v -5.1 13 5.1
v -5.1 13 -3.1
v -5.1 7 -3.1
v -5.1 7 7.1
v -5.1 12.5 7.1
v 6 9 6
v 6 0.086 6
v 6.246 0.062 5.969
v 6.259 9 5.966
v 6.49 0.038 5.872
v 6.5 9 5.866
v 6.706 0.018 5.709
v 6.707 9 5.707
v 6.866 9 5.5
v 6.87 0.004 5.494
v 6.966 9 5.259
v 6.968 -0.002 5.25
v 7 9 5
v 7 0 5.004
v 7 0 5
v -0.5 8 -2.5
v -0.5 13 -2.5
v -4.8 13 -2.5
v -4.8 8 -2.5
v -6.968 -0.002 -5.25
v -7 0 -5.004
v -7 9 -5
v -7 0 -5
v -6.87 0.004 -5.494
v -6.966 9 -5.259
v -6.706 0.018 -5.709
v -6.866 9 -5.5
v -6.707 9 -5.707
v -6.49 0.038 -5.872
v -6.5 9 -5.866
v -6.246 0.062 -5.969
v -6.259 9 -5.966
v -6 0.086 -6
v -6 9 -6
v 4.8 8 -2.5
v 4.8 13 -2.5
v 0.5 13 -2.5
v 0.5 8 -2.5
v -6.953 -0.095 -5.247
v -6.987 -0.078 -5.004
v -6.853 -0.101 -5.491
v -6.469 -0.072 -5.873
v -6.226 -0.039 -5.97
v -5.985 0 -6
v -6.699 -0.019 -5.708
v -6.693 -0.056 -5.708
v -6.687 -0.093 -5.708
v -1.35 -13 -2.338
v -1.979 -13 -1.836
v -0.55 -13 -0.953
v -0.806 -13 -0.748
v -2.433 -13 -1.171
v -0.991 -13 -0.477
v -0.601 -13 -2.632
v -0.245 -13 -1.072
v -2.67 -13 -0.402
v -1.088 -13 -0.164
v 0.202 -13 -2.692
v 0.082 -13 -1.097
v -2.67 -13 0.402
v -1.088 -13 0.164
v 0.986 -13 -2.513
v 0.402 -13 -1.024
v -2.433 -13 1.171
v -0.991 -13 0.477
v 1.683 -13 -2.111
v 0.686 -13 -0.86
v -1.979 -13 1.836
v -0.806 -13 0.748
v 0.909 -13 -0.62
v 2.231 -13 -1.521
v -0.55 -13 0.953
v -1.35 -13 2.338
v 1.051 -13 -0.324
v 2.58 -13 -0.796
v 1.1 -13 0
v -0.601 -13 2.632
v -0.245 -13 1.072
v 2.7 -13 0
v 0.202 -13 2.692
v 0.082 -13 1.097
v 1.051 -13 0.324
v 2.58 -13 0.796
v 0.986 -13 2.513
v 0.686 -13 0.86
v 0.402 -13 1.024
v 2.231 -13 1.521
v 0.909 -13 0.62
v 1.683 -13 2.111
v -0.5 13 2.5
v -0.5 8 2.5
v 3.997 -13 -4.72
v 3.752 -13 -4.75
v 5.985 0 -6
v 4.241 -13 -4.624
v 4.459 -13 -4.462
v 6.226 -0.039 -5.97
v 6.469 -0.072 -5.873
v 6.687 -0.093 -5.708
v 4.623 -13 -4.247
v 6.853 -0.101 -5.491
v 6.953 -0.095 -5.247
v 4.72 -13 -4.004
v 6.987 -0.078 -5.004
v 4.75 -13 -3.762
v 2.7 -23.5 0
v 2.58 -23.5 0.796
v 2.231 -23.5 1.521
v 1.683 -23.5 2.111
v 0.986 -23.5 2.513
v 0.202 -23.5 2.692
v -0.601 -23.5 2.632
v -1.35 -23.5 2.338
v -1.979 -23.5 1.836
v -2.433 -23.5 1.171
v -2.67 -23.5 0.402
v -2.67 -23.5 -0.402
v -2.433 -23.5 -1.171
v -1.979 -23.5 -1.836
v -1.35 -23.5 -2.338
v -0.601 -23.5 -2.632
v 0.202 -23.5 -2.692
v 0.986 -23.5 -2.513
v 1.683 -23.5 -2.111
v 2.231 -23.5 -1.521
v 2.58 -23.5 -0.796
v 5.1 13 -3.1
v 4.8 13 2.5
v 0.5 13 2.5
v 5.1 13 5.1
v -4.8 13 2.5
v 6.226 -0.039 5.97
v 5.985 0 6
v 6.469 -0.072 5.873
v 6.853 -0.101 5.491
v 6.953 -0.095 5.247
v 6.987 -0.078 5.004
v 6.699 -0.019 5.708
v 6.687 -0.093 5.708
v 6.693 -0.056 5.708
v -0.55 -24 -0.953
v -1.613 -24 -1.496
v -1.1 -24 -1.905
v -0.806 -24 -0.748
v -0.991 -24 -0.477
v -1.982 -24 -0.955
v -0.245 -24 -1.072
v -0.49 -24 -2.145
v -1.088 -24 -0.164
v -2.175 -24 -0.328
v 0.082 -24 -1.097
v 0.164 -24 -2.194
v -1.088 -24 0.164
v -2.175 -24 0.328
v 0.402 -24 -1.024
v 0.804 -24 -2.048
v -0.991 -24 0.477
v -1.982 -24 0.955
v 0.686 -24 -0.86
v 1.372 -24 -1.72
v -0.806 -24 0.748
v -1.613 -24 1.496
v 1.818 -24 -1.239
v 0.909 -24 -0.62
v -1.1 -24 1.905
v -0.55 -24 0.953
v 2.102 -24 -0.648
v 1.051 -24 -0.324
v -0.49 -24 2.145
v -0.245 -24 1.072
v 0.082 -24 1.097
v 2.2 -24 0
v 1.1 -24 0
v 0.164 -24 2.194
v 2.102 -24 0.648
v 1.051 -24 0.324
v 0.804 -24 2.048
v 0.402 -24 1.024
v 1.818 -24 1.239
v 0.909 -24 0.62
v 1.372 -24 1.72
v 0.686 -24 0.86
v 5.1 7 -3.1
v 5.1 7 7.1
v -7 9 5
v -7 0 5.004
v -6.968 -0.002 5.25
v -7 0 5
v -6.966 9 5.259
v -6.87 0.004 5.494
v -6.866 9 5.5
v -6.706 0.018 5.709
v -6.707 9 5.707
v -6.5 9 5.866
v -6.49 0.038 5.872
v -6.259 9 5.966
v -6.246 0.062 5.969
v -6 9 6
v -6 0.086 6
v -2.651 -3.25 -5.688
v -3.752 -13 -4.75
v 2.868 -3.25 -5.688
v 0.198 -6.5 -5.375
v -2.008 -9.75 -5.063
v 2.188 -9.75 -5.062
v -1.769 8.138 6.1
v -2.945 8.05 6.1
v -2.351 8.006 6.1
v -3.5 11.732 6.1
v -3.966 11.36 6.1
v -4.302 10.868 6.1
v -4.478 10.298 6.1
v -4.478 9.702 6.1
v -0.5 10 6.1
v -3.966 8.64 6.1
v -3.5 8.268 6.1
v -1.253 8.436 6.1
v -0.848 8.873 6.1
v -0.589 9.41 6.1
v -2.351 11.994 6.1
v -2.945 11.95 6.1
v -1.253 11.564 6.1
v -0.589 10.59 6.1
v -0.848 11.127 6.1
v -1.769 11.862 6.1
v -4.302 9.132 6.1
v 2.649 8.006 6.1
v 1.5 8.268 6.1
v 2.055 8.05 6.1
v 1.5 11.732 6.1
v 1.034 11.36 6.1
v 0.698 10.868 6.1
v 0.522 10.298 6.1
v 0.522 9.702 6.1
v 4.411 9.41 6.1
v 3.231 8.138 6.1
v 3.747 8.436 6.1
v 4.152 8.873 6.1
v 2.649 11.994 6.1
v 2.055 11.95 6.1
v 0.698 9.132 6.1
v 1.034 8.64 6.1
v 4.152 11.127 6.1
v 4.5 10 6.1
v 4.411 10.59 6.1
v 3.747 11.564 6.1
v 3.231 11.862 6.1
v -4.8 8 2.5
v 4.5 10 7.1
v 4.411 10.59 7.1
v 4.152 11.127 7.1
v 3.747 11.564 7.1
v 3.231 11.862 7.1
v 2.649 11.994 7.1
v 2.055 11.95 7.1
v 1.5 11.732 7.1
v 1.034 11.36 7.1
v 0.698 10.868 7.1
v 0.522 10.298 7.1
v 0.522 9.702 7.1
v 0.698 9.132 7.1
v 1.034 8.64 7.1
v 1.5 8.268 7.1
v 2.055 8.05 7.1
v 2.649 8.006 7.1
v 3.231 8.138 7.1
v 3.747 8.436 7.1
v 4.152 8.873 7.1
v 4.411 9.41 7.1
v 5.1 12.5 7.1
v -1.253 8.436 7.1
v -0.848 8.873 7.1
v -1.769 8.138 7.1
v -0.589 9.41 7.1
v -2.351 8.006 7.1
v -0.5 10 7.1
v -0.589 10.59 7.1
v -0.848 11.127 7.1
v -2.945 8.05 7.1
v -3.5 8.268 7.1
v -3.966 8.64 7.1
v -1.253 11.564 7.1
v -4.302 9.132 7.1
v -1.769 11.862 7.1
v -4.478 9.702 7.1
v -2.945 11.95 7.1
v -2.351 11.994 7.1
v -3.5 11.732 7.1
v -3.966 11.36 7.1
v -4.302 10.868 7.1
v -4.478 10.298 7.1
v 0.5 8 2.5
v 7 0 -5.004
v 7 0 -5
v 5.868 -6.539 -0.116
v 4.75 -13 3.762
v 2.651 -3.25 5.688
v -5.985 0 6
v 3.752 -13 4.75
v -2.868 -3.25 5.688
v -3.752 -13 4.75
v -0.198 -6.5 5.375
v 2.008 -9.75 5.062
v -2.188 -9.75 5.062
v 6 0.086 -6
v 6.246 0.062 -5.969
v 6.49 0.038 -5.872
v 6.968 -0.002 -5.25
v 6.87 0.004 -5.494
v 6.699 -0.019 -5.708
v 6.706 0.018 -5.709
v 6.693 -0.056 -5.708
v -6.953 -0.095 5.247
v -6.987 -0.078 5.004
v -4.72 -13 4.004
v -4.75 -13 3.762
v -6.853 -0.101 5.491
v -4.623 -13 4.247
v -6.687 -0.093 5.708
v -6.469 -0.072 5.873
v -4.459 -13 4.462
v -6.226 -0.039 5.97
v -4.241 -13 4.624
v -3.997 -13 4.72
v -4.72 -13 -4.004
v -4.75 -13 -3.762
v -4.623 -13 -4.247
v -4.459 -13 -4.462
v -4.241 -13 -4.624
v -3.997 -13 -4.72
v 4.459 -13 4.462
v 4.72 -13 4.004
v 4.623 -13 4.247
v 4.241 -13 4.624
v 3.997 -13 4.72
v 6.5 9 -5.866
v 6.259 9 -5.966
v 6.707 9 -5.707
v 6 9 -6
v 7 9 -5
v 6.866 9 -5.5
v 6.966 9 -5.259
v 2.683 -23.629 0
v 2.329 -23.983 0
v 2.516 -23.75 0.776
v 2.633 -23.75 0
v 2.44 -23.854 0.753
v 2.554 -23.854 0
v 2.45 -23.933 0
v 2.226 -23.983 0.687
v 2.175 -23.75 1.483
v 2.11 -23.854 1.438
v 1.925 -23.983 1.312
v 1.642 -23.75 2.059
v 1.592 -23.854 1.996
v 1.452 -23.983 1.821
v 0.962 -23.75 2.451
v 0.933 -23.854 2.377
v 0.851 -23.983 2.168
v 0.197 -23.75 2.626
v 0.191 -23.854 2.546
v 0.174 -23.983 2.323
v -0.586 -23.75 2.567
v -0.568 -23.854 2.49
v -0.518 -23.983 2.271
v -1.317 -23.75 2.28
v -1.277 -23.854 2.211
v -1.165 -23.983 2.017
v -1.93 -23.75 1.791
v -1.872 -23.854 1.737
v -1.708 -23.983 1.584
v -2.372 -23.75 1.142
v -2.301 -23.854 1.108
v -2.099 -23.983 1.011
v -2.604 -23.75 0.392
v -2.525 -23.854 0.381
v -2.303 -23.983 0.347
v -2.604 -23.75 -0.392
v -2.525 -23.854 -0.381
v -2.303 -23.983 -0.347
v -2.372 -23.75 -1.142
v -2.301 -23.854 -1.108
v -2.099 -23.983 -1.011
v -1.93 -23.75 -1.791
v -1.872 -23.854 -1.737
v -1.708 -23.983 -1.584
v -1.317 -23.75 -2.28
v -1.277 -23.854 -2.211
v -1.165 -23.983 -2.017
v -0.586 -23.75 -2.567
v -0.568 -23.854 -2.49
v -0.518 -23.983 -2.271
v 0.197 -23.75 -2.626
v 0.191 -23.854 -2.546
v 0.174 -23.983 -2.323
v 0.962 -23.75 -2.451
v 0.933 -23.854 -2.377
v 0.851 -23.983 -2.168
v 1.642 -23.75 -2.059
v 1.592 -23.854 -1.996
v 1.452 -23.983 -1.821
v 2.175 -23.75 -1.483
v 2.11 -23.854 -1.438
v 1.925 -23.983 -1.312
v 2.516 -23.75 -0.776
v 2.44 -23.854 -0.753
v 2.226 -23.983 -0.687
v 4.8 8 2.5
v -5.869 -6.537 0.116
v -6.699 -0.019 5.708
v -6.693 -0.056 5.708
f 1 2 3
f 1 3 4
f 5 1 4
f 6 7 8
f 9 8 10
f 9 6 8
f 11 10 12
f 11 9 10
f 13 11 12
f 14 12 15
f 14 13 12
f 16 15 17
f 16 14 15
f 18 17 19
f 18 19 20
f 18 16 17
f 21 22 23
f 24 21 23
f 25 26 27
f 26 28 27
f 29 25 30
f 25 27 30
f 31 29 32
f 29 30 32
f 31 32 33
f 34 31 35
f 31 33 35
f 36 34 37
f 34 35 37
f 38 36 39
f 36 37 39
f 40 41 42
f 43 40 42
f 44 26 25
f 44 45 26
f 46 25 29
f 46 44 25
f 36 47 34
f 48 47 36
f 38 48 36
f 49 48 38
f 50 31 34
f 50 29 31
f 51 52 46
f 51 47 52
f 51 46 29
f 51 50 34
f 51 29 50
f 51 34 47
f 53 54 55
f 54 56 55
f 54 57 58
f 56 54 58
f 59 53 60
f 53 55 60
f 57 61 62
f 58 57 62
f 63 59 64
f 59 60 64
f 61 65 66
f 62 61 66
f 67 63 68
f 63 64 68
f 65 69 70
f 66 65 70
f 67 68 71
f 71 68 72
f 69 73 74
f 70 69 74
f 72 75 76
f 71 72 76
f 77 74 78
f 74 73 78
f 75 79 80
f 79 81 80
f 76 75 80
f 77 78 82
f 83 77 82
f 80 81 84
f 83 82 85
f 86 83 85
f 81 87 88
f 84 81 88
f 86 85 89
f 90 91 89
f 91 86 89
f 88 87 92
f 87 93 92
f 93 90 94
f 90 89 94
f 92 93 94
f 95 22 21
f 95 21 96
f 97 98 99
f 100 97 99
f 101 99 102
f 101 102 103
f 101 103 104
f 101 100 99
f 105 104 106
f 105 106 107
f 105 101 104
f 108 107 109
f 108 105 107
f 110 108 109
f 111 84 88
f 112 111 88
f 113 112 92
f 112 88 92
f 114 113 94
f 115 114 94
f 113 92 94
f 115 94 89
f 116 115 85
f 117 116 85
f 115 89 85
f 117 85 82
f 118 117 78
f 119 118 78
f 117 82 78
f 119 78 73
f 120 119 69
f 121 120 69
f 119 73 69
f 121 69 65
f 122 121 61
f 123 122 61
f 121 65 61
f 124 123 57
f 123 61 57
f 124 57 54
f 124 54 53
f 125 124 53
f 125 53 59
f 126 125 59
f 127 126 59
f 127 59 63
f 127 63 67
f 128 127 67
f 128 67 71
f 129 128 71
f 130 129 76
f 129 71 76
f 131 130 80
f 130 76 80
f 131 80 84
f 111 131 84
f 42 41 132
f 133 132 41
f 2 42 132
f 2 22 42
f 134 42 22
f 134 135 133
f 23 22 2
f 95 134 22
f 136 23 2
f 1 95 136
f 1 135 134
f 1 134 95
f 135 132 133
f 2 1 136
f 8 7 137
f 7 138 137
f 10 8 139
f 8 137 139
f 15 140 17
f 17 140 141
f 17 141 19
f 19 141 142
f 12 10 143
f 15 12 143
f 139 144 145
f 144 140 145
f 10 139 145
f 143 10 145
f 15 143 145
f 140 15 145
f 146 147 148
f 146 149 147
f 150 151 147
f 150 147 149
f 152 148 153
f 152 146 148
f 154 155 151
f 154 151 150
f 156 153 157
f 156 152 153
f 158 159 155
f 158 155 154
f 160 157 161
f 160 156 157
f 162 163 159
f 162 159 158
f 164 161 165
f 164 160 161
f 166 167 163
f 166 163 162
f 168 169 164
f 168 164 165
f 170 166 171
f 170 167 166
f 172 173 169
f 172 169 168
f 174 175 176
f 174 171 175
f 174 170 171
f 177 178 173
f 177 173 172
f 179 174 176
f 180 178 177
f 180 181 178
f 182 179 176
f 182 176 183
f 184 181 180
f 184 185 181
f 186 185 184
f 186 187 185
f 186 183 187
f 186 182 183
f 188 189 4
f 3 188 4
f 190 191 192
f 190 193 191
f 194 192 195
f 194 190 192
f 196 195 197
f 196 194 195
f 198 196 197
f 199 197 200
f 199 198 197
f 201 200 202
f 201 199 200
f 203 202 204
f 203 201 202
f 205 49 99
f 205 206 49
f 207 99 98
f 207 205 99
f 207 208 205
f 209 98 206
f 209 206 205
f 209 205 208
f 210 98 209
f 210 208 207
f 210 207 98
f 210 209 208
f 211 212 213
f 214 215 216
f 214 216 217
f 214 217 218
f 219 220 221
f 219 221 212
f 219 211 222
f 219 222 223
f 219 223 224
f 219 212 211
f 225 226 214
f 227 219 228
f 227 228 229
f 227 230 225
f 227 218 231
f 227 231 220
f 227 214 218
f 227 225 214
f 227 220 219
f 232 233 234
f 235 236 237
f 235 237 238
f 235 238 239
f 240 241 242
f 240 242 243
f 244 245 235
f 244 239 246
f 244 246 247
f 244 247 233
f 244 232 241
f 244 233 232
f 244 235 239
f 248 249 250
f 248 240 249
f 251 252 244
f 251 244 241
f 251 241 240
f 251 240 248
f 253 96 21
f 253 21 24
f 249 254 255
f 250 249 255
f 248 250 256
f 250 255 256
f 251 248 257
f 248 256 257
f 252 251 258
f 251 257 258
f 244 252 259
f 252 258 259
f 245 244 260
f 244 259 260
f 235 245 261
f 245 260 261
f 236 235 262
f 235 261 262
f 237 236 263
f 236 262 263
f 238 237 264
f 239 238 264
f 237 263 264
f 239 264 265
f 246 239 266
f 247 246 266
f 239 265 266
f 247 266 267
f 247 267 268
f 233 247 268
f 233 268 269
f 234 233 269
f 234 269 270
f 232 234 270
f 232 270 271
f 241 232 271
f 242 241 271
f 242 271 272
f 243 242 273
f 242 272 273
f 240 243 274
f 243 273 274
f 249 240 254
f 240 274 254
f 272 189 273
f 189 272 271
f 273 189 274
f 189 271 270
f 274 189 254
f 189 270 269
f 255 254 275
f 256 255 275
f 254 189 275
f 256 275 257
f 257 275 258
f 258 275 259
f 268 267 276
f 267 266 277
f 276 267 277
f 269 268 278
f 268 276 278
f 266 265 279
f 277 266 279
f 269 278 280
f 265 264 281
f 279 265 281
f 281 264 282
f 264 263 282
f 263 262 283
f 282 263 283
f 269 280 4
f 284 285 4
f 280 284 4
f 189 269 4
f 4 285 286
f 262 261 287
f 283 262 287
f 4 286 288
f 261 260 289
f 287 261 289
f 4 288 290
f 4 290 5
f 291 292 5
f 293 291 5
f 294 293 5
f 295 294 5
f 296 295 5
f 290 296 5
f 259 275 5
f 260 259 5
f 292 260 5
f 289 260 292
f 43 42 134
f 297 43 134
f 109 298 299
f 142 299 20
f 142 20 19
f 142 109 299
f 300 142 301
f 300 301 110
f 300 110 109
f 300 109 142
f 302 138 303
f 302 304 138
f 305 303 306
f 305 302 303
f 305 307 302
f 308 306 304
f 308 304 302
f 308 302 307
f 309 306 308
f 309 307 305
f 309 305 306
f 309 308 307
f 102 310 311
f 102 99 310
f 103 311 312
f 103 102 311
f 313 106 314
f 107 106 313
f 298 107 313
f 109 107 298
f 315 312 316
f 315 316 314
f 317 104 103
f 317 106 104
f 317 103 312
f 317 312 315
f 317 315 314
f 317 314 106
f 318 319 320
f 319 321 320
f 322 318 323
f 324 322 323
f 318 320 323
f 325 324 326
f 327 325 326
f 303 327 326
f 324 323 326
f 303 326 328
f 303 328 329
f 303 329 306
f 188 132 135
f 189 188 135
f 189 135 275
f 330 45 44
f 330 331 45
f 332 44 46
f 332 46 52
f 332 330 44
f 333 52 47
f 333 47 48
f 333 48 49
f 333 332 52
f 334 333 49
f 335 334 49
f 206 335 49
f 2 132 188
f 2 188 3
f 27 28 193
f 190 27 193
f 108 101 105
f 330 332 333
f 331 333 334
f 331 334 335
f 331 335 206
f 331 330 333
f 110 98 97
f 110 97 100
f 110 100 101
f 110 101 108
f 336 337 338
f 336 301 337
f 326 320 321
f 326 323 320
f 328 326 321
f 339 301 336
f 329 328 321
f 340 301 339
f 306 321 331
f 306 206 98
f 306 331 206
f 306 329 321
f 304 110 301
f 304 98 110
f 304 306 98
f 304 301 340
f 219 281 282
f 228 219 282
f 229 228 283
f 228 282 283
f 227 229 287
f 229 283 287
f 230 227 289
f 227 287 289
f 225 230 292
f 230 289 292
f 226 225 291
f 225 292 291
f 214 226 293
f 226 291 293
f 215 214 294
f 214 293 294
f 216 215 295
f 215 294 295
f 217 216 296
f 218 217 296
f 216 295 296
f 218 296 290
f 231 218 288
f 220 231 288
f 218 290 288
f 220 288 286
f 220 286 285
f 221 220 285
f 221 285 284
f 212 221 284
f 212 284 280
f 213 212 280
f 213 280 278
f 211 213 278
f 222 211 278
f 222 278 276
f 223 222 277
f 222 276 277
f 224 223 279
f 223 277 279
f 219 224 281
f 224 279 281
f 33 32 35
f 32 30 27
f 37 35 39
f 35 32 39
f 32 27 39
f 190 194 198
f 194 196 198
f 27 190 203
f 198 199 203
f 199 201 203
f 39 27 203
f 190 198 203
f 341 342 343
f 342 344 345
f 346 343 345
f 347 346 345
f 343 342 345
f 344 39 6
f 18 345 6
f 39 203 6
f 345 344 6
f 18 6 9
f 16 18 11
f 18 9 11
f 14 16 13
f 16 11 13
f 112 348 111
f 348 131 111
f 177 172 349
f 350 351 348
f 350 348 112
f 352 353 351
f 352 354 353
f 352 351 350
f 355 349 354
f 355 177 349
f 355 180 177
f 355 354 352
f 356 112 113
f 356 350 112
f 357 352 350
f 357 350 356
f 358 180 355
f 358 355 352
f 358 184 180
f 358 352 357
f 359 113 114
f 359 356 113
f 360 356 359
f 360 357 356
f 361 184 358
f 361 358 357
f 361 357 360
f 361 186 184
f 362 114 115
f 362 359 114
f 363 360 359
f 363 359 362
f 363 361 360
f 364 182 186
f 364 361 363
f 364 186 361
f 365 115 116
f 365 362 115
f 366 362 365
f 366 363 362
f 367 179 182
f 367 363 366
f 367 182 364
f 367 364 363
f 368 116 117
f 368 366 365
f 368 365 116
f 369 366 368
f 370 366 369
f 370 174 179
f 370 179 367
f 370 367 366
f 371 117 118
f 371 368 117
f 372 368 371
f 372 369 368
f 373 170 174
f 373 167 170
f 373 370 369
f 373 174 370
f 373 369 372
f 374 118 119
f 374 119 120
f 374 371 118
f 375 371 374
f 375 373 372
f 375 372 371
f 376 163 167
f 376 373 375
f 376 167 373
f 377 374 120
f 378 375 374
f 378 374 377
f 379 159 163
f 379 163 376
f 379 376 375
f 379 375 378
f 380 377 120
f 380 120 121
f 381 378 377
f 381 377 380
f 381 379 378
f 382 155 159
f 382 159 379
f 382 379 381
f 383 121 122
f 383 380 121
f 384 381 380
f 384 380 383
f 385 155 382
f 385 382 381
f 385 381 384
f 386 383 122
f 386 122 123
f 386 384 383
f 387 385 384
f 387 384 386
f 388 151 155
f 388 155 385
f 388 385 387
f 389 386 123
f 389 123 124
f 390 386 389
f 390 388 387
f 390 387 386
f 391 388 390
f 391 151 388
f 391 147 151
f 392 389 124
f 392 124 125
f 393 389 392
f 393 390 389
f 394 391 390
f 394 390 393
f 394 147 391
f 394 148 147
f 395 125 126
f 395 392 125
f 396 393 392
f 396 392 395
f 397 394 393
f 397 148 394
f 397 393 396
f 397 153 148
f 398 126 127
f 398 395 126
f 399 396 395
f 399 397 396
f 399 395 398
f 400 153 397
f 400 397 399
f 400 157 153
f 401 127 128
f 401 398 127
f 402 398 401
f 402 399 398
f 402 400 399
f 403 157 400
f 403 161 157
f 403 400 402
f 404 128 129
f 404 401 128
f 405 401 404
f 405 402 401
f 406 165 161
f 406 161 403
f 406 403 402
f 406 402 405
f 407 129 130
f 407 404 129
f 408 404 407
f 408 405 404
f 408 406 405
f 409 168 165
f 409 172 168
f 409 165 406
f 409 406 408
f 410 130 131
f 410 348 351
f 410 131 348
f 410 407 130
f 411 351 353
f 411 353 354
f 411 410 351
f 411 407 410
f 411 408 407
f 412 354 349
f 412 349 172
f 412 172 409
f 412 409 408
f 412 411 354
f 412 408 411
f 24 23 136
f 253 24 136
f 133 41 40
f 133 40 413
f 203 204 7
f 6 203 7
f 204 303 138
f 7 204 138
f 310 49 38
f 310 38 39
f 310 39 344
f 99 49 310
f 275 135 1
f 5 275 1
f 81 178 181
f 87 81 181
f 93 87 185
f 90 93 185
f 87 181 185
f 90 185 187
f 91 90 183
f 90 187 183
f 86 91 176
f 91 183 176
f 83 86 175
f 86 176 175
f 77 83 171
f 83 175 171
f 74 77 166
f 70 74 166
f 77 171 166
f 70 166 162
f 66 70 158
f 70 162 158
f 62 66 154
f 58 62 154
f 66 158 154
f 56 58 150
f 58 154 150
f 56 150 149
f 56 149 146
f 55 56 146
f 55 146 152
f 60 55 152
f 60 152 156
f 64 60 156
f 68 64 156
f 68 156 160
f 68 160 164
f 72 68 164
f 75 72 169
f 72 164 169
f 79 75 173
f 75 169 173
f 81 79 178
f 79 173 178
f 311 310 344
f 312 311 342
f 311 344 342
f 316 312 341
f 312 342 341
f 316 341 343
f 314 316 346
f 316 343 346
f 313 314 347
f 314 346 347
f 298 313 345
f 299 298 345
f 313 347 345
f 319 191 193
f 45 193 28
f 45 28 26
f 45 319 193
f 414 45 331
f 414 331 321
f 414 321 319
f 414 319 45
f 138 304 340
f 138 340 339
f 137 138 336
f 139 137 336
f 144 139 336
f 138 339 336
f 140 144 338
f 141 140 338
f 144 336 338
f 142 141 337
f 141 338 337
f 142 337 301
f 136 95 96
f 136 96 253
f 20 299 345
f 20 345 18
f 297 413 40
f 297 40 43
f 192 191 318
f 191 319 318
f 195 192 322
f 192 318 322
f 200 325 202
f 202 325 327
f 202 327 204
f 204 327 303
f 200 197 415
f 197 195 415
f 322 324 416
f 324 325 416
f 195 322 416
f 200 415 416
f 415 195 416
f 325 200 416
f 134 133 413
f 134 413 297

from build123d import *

# Parameters (mm, degrees)
SKETCH_W          = 14
SKETCH_H          = 12
PAD_DEPTH         = 9
SKETCH002_W       = 14
SKETCH002_H       = 12
SKETCH001_W       = 9.5
SKETCH001_H       = 9.5
FILLET_R          = 1
SKETCH003_R       = 2.7
PAD001_DEPTH      = 11
FILLET001_R       = 0.5
SKETCH004_R       = 1.1
POCKET_DEPTH      = 11
SKETCH005_W       = 10.2
SKETCH005_H       = 10.2
PAD002_DEPTH      = 4
PAD002_DEPTH_BACK = 2
SKETCH006_R       = 2
POCKET001_DEPTH   = 1
CHAMFER_SIZE2     = 2
CHAMFER_SIZE      = 0.5
SKETCH007_W       = 4.3
SKETCH007_H       = 5
POCKET002_DEPTH   = 5


with BuildPart() as shell:
    # Sketch → Pad (new body)
    with BuildSketch(Plane.XZ):
        Rectangle(SKETCH_W, SKETCH_H)
    extrude(amount=-PAD_DEPTH)

    # Sketch002 (on Face5 of Pad) → AdditiveLoft section 0
    with BuildSketch(Plane.XZ):
        Rectangle(SKETCH002_W, SKETCH002_H)
    # Sketch001 (on DatumPlane) → AdditiveLoft section 1
    with BuildSketch(Plane.XZ.offset(13)):
        Rectangle(SKETCH001_W, SKETCH001_H)
    loft()

    # Fillet
    fillet_edges = [shell.edges().sort_by_distance(p)[0] for p in [
        (-7, 4.5, -6),
        (-5.875, -6.5, -5.375),
        (-5.875, -6.5, 5.375),
        (-7, 4.5, 6),
        (7, 4.5, -6),
        (5.875, -6.5, -5.375),
        (7, 4.5, 6),
        (5.875, -6.5, 5.375),
    ]]
    fillet(fillet_edges, radius=FILLET_R)


with BuildPart() as powerouter:
    # Sketch003 (on Face1 of CopyFillet) → Pad001 (new body)
    with BuildSketch(Plane.XZ.offset(13)):
        Circle(SKETCH003_R)
    extrude(amount=PAD001_DEPTH)

    # Fillet001
    fillet001_edges = [powerouter.edges().sort_by_distance(p)[0] for p in [
        (-2.7, -24, 0),
    ]]
    fillet(fillet001_edges, radius=FILLET001_R)

    # Sketch004 (on Face4 of Fillet001) → Pocket (cut)
    with BuildSketch(Plane.XZ.offset(24)):
        Circle(SKETCH004_R)
    extrude(amount=-POCKET_DEPTH, mode=Mode.SUBTRACT)


with BuildPart() as powerheader:
    # Sketch005 (on Face1 of CopyFillet001) → Pad002 (new body, two sides)
    with BuildSketch(Plane(origin=(0, 9, 0), x_dir=(-1, 0, 0), z_dir=(0, 1, 0))) as pad002_sk:
        with Locations((0, 2)):
            Rectangle(SKETCH005_W, SKETCH005_H)
    extrude(amount=PAD002_DEPTH)
    extrude(pad002_sk.sketch, amount=-PAD002_DEPTH_BACK)

    # Sketch006 (on Face1 of Pad002) → Pocket001 (cut)
    with BuildSketch(Plane(origin=(0, 9, 7.1), x_dir=(1, 0, 0), z_dir=(0, 0, 1))):
        with Locations((-2.5, 1)):
            Circle(SKETCH006_R)
        with Locations((2.5, 1)):
            Circle(SKETCH006_R)
    extrude(amount=-POCKET001_DEPTH, mode=Mode.SUBTRACT)

    # Chamfer
    chamfer_edges = [powerheader.edges().sort_by_distance(p)[0] for p in [
        (0, 13, 7.1),
    ]]
    chamfer_side = powerheader.faces().sort_by_distance((0, 10, 7.1))[0]
    chamfer(chamfer_edges, length=CHAMFER_SIZE, length2=CHAMFER_SIZE2, reference=chamfer_side)

    # Sketch007 (on Face8 of Chamfer) → Pocket002 (cut)
    with BuildSketch(Plane(origin=(0, 13, 0), x_dir=(-1, 0, 0), z_dir=(0, 1, 0))):
        with Locations((-2.65, 0)):
            Rectangle(SKETCH007_W, SKETCH007_H)
        with Locations((2.65, 0)):
            Rectangle(SKETCH007_W, SKETCH007_H)
    extrude(amount=-POCKET002_DEPTH, mode=Mode.SUBTRACT)


solid = Compound([shell.part, powerouter.part, powerheader.part])
